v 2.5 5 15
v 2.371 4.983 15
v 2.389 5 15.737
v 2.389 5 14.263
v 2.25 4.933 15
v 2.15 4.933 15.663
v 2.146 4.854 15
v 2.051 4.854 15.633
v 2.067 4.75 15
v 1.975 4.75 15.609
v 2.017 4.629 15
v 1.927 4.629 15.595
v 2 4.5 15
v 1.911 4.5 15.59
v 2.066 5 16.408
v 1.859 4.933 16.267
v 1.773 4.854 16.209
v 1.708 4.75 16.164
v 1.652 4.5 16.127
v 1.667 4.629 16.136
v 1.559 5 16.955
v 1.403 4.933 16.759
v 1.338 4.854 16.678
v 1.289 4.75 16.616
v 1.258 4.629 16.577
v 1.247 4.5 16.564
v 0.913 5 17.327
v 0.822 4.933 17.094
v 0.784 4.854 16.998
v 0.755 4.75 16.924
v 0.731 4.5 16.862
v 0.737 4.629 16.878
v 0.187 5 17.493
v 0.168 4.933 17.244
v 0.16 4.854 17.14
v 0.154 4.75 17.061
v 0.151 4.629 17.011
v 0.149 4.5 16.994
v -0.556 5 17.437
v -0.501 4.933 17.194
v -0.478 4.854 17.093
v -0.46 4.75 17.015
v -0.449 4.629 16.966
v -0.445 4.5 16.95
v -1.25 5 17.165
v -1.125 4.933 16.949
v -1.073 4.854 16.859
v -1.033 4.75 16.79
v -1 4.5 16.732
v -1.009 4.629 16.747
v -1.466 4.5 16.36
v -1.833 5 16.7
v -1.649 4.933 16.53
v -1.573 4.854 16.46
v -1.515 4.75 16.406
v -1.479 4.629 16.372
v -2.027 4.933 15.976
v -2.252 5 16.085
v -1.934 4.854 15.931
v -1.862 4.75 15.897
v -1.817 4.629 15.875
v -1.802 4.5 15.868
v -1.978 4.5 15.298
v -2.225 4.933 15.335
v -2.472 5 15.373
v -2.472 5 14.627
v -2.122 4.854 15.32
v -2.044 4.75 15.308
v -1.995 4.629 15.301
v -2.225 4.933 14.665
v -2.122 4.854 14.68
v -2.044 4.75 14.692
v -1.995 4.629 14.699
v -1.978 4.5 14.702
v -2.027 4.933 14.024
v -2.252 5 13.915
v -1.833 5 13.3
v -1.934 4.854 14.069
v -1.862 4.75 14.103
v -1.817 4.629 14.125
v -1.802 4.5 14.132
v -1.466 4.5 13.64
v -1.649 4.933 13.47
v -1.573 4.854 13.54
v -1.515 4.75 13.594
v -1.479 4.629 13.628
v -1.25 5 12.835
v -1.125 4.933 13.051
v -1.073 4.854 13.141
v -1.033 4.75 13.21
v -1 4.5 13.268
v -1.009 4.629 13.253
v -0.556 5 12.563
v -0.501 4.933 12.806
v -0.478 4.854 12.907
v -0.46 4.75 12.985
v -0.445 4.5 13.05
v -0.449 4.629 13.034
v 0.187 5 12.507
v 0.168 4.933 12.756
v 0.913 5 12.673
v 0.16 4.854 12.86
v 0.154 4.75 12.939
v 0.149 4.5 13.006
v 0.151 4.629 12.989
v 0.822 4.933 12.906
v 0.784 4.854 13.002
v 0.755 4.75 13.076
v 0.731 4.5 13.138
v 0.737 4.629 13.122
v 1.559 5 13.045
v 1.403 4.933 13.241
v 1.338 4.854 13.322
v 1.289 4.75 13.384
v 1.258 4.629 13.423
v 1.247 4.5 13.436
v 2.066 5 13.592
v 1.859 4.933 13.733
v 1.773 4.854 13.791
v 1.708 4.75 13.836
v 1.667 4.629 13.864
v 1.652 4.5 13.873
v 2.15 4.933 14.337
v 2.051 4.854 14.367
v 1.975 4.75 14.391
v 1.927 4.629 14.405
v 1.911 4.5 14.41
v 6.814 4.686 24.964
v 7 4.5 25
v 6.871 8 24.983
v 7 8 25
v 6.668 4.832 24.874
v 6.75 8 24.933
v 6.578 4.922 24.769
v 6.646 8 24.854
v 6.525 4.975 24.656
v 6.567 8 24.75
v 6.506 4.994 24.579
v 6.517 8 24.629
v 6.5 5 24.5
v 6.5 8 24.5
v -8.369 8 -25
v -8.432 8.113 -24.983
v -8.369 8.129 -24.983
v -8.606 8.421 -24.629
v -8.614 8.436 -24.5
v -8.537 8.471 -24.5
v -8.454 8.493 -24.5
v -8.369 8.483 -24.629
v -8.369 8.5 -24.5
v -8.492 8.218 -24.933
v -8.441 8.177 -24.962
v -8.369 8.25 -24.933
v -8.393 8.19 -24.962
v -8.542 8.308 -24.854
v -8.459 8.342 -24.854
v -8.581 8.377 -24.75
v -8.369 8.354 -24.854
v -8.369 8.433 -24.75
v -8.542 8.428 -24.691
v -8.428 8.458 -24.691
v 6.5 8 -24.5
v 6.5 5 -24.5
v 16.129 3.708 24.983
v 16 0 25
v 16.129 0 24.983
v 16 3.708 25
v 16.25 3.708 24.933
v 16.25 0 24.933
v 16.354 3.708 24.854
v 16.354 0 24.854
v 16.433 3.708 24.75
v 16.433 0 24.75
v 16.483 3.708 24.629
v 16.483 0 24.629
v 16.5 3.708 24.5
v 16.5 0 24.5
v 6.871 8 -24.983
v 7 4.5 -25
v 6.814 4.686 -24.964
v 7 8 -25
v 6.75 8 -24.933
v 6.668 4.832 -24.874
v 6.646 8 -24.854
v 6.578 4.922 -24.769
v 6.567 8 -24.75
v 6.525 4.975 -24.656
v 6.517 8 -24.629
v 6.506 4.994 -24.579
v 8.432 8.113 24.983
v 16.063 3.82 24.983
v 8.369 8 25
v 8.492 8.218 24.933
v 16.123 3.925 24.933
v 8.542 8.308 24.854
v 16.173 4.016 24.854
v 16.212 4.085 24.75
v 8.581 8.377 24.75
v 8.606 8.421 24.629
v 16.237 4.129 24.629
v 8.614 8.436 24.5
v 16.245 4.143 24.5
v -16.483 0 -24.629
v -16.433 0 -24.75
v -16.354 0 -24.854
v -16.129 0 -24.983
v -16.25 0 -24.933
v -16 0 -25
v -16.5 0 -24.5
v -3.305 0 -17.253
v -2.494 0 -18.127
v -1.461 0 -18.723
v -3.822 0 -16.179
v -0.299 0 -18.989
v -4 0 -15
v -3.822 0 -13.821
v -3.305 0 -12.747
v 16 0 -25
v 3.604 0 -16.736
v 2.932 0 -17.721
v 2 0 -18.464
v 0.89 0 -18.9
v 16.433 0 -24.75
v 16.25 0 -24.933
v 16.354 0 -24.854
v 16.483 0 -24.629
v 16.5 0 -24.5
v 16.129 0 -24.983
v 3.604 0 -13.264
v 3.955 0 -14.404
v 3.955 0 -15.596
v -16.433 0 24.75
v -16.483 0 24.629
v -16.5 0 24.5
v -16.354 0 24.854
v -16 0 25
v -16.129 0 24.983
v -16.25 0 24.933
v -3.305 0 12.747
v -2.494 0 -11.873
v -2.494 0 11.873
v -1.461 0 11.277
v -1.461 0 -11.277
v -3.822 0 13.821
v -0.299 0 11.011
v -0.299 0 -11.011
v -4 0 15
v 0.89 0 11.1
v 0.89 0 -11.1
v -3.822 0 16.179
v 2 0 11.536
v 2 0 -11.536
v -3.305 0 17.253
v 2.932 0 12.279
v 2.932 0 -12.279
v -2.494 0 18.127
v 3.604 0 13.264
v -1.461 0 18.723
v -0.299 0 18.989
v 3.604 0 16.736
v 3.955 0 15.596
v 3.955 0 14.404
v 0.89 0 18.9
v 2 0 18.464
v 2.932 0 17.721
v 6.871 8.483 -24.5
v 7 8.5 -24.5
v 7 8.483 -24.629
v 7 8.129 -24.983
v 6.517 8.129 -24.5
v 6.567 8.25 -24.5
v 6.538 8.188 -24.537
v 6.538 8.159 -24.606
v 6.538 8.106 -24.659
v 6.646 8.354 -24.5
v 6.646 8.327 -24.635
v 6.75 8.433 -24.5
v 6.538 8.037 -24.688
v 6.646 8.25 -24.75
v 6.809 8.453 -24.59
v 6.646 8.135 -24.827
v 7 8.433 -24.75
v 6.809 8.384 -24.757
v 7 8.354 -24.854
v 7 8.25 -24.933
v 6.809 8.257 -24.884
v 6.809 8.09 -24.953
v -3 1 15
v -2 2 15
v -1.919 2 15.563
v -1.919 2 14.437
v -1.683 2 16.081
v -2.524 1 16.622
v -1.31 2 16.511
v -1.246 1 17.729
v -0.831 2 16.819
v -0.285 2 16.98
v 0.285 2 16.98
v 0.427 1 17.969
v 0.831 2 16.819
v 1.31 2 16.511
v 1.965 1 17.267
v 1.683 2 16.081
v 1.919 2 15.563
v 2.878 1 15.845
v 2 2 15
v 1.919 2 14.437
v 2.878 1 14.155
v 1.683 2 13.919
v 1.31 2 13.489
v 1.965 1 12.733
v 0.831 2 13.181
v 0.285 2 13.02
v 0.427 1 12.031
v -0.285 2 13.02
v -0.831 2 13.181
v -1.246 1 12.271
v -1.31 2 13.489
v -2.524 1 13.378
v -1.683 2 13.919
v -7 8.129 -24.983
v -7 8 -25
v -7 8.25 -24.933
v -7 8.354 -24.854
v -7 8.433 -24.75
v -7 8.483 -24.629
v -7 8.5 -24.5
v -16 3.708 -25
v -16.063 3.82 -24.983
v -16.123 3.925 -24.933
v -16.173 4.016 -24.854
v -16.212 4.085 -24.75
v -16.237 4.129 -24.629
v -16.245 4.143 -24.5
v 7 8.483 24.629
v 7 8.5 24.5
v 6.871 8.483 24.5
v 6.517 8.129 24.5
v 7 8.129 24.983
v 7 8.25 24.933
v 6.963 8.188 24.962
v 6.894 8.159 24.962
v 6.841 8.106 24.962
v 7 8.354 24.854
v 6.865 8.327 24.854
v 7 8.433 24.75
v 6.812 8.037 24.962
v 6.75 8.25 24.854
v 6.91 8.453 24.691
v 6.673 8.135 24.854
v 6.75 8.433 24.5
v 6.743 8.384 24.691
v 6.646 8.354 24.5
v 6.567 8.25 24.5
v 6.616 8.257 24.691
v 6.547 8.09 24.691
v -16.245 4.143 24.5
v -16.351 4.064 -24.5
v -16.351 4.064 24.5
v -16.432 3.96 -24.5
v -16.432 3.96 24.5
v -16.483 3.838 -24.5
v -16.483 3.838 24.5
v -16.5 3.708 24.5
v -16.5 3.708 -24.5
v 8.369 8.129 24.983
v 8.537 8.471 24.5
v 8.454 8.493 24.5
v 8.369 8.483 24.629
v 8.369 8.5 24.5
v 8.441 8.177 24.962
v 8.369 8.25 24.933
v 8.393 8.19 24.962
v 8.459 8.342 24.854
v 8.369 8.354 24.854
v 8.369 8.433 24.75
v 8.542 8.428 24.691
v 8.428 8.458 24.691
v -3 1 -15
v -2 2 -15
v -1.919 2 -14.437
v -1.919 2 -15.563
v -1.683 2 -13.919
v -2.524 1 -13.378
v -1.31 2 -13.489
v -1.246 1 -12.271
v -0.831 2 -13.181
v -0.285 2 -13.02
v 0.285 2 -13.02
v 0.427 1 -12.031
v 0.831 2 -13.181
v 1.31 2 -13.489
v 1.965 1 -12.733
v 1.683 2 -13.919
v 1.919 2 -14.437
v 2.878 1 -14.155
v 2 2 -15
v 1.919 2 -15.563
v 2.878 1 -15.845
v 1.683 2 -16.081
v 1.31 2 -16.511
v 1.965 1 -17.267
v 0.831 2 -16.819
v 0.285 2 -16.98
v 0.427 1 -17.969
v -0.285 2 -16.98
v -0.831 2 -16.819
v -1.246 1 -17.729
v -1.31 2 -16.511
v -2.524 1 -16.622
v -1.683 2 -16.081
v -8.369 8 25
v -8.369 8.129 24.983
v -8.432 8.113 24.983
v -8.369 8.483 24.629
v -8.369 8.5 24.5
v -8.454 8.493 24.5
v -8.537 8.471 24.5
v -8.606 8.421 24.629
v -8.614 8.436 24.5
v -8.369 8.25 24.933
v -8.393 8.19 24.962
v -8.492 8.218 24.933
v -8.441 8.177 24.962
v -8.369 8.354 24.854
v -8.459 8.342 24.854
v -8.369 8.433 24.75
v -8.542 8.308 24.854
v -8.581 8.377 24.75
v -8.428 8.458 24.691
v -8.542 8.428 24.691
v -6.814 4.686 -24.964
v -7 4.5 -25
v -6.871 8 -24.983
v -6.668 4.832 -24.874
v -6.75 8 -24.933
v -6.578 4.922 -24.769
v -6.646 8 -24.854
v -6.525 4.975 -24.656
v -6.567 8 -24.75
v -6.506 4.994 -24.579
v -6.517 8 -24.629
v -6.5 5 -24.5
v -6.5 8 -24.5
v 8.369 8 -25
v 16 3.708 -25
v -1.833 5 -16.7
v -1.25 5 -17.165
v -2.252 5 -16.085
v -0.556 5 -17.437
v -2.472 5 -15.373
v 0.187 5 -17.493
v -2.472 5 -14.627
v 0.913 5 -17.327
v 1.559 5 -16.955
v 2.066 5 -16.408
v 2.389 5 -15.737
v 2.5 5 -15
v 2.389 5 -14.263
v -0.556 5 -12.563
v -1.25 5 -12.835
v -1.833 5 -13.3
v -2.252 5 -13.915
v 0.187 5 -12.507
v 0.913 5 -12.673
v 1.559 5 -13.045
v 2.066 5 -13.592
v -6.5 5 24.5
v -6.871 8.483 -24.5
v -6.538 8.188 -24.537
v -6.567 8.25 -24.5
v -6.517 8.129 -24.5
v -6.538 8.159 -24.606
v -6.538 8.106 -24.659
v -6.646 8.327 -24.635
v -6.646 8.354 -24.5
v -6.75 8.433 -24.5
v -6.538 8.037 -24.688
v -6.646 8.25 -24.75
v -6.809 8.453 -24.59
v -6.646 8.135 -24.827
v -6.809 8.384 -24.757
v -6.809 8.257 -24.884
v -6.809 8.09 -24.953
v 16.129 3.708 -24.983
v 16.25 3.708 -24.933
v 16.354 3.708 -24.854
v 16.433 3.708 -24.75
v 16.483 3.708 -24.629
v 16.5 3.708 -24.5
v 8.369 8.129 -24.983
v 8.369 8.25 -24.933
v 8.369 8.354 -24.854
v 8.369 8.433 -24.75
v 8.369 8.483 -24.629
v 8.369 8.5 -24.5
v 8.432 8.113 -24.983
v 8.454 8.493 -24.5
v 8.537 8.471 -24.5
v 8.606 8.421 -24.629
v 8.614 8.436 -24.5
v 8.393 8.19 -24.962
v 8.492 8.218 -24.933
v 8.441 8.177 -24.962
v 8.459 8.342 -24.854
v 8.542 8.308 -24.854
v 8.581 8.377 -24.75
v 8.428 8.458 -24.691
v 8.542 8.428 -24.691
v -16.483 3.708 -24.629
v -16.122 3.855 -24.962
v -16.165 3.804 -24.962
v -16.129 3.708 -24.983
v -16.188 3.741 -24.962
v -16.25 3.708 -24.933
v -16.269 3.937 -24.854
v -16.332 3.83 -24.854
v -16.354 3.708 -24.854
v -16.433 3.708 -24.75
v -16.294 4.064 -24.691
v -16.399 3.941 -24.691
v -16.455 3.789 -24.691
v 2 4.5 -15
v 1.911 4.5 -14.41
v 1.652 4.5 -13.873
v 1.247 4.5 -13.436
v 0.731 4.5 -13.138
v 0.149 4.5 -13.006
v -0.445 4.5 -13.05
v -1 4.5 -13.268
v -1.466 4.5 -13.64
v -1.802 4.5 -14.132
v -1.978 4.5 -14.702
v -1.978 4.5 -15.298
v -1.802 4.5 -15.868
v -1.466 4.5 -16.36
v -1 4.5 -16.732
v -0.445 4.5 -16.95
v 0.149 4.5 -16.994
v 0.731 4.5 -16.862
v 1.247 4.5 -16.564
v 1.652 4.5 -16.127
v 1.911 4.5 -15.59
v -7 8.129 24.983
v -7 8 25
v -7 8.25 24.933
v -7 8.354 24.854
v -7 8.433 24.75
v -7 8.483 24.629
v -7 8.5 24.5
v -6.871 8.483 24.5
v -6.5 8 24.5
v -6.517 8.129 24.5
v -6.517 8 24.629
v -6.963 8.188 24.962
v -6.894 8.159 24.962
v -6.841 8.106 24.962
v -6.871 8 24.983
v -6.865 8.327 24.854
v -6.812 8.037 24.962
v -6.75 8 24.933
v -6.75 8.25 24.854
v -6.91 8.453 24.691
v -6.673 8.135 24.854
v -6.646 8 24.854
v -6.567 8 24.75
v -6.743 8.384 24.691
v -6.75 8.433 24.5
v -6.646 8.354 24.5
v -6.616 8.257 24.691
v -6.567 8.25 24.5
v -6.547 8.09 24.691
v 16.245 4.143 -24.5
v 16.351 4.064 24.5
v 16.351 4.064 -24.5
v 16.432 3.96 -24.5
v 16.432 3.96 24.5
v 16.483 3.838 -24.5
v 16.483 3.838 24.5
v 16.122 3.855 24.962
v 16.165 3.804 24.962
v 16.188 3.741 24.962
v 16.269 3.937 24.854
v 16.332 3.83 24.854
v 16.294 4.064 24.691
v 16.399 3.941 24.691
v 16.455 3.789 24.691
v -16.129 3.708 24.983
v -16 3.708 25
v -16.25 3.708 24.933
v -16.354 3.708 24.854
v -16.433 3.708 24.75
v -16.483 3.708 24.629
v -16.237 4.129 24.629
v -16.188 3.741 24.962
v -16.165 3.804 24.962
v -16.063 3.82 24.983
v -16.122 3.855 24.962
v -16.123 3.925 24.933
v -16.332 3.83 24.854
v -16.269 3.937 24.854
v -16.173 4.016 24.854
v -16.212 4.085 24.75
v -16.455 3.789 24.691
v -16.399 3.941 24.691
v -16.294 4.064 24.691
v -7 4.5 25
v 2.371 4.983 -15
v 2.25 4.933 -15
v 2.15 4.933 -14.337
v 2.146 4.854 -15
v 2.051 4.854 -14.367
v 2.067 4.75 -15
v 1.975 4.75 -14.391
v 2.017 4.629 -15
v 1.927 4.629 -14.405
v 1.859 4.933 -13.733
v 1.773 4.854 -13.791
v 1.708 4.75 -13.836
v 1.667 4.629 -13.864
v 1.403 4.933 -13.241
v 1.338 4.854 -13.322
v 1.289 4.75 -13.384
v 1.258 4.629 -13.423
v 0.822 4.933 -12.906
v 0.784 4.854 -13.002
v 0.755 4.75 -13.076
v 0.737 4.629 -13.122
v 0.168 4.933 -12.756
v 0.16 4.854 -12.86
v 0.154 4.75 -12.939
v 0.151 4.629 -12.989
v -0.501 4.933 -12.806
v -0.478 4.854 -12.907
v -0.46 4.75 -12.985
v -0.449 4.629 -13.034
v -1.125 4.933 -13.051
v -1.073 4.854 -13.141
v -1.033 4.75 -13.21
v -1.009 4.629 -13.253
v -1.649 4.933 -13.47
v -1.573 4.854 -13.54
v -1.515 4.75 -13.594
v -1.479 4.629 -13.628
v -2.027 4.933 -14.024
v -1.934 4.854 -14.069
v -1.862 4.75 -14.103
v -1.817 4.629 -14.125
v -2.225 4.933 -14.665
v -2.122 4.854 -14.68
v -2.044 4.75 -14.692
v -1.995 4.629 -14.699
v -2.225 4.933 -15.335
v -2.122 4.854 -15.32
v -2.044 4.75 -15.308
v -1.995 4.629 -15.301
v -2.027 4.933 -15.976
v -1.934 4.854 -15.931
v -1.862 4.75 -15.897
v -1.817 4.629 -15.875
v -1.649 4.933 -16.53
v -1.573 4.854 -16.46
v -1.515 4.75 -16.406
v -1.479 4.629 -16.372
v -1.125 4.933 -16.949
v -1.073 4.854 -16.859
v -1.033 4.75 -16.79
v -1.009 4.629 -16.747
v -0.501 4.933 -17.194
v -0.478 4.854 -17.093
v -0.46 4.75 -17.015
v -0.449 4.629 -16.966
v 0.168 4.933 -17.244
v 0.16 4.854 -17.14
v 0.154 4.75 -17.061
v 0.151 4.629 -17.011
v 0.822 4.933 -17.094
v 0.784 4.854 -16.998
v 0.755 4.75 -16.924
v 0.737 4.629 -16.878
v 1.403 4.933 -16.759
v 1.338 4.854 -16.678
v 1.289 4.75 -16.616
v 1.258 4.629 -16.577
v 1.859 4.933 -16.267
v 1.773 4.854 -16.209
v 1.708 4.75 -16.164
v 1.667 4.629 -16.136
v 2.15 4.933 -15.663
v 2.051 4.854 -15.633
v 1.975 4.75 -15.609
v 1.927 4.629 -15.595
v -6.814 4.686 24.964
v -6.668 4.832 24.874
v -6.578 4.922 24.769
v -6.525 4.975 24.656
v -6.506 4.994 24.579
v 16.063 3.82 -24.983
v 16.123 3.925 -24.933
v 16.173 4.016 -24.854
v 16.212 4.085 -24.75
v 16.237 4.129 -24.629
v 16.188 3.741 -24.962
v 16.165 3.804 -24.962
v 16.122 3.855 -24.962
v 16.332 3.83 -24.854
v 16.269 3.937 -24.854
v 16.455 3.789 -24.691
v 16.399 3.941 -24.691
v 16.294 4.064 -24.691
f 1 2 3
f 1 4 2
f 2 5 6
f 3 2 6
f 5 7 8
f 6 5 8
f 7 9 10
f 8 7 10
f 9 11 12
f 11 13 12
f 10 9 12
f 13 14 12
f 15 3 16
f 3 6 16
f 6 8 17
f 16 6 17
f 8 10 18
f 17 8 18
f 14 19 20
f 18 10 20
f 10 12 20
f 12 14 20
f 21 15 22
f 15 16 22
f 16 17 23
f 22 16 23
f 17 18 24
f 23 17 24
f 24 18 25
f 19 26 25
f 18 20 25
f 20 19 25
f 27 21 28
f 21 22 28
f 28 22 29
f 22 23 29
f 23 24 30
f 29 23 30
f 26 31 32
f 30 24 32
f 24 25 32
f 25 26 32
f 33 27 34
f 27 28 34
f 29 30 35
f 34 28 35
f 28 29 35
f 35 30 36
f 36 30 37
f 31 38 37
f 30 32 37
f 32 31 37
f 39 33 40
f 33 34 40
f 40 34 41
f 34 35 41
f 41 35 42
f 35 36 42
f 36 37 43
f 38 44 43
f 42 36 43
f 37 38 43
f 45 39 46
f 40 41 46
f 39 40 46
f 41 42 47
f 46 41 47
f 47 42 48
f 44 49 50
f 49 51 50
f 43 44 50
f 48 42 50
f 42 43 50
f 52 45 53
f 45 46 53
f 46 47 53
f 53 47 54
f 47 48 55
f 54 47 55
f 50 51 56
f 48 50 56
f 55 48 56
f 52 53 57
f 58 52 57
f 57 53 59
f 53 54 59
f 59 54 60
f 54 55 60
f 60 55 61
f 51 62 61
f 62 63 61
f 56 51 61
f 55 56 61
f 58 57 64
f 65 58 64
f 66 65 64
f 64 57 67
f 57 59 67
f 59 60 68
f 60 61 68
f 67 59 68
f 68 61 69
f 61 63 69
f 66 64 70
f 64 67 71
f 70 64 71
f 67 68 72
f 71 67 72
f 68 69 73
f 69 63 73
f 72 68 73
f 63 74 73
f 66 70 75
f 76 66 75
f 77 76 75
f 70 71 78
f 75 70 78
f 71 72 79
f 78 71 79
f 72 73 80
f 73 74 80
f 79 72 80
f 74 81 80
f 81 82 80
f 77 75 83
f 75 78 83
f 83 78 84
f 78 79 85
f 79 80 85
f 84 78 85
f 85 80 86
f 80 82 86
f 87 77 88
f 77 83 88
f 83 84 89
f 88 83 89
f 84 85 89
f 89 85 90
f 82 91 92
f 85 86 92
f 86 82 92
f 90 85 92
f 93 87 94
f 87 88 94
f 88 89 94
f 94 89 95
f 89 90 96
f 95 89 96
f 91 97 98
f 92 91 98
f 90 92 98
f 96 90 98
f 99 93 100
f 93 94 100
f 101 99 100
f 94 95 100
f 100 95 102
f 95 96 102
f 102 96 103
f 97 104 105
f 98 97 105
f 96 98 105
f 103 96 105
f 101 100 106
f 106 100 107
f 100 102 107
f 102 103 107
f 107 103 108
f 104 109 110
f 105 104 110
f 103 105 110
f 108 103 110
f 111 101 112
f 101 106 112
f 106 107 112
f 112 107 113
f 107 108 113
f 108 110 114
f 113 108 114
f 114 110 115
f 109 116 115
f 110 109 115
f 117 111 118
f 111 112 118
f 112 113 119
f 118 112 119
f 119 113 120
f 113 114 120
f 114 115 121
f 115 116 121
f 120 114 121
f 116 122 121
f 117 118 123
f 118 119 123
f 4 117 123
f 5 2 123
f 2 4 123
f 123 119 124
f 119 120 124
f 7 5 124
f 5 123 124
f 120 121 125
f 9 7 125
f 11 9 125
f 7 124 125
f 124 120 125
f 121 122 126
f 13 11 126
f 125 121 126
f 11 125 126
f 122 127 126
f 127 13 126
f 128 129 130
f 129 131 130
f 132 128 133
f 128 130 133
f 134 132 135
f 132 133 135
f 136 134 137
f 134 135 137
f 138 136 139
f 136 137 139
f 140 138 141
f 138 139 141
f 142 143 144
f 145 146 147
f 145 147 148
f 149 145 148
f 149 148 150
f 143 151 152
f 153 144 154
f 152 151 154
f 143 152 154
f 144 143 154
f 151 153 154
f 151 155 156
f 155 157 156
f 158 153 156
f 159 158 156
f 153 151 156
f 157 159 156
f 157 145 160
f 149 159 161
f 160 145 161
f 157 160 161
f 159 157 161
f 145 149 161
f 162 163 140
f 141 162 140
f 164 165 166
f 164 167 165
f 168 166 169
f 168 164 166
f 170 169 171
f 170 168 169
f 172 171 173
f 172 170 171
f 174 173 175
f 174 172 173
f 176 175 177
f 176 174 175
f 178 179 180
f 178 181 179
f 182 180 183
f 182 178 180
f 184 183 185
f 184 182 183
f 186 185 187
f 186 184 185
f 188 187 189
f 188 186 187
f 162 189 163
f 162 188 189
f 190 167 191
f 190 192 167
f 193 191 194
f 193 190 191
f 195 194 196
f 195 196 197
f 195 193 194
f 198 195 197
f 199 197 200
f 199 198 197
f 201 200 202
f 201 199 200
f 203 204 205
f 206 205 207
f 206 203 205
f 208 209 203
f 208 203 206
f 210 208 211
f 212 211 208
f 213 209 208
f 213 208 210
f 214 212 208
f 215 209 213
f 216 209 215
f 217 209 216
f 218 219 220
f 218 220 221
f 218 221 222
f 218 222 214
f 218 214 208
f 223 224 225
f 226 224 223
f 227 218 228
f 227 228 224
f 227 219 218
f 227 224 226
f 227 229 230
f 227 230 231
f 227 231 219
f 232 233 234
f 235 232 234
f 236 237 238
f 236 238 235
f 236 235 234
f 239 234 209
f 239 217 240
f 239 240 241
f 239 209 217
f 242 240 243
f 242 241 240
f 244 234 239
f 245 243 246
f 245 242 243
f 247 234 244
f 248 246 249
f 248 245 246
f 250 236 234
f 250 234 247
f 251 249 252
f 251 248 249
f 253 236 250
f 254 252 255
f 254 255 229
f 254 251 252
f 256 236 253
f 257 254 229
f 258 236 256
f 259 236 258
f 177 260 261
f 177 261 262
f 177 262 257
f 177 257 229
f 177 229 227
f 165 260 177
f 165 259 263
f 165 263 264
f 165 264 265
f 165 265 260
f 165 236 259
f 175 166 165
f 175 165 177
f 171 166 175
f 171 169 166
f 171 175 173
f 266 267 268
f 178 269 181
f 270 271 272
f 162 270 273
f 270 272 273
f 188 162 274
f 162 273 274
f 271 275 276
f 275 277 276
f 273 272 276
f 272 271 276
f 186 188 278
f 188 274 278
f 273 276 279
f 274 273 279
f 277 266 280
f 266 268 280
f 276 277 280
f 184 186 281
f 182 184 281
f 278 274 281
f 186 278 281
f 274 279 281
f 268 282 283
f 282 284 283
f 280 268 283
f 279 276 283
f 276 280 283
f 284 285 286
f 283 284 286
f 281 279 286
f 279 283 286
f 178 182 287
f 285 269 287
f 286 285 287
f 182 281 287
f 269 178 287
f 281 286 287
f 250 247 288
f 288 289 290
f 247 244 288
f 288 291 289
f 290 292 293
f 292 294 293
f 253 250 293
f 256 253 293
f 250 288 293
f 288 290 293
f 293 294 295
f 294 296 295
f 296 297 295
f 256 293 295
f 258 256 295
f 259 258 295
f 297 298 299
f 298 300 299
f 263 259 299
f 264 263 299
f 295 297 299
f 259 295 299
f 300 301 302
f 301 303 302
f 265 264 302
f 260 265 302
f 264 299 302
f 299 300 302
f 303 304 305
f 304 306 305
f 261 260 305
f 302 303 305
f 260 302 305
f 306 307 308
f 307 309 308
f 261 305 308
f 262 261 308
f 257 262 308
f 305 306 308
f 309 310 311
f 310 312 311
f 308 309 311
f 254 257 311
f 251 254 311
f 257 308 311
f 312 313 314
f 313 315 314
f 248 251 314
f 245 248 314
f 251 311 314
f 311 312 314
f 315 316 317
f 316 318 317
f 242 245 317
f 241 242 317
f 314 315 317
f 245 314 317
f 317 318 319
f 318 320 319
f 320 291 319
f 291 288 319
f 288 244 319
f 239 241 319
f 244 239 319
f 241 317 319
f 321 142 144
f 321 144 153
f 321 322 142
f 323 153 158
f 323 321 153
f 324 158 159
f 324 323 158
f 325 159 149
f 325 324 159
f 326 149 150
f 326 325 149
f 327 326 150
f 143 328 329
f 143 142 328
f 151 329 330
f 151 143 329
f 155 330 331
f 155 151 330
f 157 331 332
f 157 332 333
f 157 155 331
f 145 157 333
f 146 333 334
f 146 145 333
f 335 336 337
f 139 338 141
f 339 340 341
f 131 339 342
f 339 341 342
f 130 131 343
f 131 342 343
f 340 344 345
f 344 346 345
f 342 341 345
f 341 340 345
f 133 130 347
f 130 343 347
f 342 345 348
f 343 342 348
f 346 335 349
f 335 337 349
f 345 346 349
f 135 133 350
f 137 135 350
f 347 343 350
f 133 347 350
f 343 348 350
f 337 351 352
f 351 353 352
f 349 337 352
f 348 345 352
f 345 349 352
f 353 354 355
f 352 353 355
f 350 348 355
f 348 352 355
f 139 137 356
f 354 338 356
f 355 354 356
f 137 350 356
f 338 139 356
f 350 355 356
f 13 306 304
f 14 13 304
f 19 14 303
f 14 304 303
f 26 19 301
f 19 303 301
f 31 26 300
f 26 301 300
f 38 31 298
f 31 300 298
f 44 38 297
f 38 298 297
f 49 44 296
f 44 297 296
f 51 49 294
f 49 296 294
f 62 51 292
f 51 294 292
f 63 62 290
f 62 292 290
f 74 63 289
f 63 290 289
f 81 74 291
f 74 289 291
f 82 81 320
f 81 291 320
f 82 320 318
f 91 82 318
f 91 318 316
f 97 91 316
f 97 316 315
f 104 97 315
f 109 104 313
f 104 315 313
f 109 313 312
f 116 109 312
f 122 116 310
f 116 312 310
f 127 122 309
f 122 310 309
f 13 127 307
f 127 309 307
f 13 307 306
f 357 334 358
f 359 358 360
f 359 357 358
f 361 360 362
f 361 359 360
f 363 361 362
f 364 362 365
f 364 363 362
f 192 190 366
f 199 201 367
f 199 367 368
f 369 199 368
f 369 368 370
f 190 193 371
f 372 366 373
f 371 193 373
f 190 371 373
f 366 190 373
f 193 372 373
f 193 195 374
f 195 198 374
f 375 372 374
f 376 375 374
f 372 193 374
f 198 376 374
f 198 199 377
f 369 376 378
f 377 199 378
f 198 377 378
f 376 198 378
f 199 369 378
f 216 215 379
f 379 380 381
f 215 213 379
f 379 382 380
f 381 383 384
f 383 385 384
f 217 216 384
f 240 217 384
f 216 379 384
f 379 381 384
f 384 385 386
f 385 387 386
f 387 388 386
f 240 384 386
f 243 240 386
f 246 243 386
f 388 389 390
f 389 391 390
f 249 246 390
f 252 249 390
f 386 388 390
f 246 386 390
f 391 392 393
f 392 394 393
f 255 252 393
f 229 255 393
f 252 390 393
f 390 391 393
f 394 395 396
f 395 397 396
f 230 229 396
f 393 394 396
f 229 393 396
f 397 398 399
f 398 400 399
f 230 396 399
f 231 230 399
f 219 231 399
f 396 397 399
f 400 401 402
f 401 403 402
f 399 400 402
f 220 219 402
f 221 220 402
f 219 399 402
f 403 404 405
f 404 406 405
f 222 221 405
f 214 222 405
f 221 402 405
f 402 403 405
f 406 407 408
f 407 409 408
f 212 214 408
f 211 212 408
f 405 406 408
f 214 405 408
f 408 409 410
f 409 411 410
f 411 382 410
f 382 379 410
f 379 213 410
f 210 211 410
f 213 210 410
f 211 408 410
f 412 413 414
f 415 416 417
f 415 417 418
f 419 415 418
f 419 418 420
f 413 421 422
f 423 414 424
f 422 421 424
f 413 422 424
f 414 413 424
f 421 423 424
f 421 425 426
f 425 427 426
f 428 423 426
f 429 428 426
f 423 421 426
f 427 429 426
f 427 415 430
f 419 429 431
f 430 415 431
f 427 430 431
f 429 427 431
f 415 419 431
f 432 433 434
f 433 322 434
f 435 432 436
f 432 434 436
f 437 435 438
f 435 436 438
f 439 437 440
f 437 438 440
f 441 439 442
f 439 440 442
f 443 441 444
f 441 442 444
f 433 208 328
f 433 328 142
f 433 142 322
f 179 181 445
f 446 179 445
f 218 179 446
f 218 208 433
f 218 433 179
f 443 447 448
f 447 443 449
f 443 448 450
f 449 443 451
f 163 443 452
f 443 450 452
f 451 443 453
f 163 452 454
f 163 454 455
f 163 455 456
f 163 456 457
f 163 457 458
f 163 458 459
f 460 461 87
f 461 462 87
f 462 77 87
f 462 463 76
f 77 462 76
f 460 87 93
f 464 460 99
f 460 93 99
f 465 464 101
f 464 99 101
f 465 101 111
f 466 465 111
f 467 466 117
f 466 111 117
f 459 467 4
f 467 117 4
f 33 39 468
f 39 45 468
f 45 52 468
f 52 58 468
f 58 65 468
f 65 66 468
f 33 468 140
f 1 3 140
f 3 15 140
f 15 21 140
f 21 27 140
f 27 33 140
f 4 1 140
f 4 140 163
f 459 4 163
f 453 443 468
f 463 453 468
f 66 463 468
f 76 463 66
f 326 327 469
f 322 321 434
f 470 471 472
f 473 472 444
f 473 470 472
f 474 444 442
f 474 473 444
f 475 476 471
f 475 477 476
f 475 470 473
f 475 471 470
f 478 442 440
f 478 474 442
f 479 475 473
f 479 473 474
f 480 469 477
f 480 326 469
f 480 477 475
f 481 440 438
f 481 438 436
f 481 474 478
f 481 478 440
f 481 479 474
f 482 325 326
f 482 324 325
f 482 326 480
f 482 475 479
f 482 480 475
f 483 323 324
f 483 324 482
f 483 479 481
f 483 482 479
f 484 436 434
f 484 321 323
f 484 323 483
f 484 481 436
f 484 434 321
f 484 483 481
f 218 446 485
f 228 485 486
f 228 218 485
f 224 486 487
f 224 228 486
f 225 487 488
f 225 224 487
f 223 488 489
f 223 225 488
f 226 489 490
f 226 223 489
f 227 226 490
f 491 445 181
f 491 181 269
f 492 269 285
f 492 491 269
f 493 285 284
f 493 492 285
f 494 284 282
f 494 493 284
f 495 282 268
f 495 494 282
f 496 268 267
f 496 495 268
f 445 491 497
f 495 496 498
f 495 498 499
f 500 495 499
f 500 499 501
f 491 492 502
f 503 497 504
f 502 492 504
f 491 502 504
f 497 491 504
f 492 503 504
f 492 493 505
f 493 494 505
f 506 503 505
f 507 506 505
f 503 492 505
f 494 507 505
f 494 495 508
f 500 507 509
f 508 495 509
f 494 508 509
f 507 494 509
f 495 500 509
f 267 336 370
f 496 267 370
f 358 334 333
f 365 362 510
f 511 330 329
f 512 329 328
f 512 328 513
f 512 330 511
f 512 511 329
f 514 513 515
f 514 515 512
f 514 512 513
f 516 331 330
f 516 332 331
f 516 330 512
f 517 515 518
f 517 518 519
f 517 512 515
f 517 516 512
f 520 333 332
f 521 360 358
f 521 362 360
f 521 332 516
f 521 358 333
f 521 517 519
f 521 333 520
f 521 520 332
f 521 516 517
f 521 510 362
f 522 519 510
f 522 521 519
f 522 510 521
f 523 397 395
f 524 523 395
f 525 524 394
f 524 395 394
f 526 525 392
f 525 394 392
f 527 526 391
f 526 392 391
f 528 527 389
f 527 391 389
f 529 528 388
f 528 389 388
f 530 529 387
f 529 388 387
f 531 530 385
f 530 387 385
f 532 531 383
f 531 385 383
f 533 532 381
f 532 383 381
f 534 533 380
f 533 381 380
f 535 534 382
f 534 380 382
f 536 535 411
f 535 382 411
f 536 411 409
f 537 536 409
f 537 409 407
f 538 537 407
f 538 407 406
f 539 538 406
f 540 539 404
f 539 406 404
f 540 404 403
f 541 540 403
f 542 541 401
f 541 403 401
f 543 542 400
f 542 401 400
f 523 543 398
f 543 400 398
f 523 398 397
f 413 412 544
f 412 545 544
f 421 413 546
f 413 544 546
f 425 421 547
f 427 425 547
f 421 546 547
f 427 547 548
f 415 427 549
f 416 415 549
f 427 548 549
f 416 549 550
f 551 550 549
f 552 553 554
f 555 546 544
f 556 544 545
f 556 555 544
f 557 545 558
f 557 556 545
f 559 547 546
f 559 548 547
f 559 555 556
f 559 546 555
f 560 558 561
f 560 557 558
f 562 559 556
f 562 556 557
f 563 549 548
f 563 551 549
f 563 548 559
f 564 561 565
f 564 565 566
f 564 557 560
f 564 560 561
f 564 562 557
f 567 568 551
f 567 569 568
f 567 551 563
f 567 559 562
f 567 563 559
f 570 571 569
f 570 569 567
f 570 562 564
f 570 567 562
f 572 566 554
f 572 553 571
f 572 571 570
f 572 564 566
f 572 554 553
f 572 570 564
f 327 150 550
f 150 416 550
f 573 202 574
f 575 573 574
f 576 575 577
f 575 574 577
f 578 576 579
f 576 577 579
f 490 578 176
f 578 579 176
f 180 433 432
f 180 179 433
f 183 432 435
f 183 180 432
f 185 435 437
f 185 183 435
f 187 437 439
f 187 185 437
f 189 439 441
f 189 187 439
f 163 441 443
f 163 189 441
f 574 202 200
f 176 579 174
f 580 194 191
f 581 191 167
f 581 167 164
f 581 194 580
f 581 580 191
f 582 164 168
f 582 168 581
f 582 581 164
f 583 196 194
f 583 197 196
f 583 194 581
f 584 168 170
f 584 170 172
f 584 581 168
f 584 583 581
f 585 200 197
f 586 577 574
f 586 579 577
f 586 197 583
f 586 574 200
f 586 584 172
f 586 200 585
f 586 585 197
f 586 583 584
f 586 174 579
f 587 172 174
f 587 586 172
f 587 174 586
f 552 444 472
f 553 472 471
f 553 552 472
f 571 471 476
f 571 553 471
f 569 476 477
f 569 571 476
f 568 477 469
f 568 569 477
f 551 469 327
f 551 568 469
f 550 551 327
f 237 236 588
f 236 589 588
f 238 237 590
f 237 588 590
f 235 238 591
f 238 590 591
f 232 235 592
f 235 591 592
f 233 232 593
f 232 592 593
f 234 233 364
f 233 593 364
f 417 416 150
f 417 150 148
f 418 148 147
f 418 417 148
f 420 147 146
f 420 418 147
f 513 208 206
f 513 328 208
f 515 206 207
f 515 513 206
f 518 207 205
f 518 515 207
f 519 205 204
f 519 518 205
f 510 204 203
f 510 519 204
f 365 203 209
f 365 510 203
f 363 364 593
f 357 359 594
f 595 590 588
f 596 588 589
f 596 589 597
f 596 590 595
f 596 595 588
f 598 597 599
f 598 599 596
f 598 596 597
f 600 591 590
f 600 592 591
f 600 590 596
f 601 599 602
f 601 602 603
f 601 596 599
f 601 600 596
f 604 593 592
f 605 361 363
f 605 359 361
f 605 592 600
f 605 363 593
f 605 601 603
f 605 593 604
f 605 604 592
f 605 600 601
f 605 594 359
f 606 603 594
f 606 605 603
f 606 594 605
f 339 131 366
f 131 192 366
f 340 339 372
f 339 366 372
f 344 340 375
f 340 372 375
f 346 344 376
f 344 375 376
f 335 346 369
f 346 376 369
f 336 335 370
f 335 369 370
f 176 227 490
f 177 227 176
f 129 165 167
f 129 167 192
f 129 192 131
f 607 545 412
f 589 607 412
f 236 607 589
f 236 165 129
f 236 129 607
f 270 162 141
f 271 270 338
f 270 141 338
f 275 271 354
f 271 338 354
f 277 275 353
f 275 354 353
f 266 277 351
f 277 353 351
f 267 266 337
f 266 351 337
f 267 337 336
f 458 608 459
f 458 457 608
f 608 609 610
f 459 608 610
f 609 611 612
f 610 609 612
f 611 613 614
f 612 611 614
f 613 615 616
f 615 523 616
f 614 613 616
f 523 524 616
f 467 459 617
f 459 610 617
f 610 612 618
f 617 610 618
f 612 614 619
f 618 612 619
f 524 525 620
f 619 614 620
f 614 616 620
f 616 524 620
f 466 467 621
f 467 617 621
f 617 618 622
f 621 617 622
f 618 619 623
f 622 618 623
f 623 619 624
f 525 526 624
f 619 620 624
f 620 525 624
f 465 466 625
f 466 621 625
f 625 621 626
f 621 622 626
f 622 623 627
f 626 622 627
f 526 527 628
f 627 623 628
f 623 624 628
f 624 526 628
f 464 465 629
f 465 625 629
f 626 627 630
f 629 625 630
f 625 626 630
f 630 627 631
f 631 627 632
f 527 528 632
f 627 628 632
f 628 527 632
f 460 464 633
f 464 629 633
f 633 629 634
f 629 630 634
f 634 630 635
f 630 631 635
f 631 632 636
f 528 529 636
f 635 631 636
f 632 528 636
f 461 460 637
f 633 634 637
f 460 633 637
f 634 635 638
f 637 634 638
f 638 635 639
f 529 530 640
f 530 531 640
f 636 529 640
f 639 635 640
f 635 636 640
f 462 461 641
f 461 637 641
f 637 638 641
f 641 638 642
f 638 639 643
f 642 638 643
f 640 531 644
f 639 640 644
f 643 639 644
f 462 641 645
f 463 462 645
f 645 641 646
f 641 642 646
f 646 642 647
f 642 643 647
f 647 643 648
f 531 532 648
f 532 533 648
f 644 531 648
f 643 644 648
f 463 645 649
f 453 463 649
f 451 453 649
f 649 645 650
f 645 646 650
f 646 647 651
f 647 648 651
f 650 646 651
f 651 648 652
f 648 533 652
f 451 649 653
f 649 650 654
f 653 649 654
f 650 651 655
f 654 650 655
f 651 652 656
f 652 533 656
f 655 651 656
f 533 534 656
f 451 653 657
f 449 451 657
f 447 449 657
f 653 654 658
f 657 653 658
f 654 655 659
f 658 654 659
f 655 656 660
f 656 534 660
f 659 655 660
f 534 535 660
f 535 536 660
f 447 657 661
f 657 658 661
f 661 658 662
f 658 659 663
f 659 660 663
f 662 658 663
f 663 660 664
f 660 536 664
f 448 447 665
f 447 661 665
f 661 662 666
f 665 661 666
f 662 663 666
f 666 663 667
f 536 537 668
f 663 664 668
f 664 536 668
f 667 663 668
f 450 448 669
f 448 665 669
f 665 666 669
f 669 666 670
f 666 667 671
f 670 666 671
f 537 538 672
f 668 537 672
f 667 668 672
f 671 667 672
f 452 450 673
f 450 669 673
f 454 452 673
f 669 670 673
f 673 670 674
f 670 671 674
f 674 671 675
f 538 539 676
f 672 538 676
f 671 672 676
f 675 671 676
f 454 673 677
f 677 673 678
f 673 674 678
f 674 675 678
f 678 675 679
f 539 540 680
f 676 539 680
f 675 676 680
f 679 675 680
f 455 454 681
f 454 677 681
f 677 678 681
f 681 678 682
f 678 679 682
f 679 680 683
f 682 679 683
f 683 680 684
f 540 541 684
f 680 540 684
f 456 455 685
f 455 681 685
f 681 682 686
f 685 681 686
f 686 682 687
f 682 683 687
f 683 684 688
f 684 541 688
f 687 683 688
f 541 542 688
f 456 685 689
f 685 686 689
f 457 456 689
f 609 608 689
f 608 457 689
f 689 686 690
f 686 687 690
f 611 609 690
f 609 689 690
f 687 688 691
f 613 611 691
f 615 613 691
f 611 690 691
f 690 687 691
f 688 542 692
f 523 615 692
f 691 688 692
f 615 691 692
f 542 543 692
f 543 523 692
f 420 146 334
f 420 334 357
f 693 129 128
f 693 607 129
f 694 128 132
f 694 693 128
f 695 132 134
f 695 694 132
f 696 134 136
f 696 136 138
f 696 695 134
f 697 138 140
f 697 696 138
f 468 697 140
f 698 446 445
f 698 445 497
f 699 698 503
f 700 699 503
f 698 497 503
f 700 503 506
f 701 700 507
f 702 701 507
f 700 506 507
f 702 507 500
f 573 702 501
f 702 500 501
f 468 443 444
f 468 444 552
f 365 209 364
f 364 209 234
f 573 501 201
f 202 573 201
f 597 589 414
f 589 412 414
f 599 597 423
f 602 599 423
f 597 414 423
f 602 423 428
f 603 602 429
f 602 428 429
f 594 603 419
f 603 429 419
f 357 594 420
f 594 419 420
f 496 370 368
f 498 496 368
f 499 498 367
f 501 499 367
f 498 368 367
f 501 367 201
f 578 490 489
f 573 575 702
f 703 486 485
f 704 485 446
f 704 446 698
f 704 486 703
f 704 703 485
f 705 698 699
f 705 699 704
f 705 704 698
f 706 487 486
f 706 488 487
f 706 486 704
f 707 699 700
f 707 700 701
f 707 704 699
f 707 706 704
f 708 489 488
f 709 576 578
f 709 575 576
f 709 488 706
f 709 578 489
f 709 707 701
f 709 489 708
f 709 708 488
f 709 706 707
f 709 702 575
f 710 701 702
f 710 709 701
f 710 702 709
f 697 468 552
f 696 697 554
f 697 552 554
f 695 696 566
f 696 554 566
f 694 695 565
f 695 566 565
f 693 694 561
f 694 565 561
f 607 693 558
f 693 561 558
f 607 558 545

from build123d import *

# Parameters (mm, degrees)
F0_W           = 12
F0_H           = 50
F0_R           = 2
F0_W_2         = 0.5
F0_W_3         = 10
F1_DEPTH       = 5
F2_DEPTH       = 8.5
F3_SIZE2       = 8
F3_SIZE        = 4.5
F4_SIZE2       = 8
F4_SIZE        = 4.5
F5_D           = 4
F5_CSINK_D     = 8
F5_CSINK_ANGLE = 90
F6_R           = 0.5


with BuildPart() as f1:
    # F0 (on Front) → F1 (new body)
    with BuildSketch(Plane.XZ):
        Rectangle(F0_W, F0_H)
        with Locations((0, -15)):
            Circle(F0_R, mode=Mode.SUBTRACT)
        with Locations((0, 15)):
            Circle(F0_R, mode=Mode.SUBTRACT)
        with Locations((6.25, 0)):
            Rectangle(F0_W_2, F0_H)
        with Locations((-6.25, 0)):
            Rectangle(F0_W_2, F0_H)
        with Locations((11.5, 0)):
            Rectangle(F0_W_3, F0_H)
        with Locations((-11.5, 0)):
            Rectangle(F0_W_3, F0_H)
    extrude(amount=-F1_DEPTH)

    # F0 (on Front) → F2 (join)
    with BuildSketch(Plane.XZ):
        with Locations((-11.5, 0)):
            Rectangle(F0_W_3, F0_H)
        with Locations((11.5, 0)):
            Rectangle(F0_W_3, F0_H)
    extrude(amount=-F2_DEPTH)

    # F3
    f3_edges = [f1.edges().sort_by_distance(p)[0] for p in [
        (-16.5, 8.5, 0),
    ]]
    f3_side = f1.faces().sort_by_distance((-16.5, 4.25, 0))[0]
    chamfer(f3_edges, length=F3_SIZE, length2=F3_SIZE2, reference=f3_side)

    # F4
    f4_edges = [f1.edges().sort_by_distance(p)[0] for p in [
        (16.5, 8.5, 0),
    ]]
    f4_side = f1.faces().sort_by_distance((16.5, 4.25, 0))[0]
    chamfer(f4_edges, length=F4_SIZE, length2=F4_SIZE2, reference=f4_side)

    # F5 (through all)
    with Locations(Plane.XZ):
        with Locations((0, 15), (0, -15)):
            CounterSinkHole(F5_D / 2, F5_CSINK_D / 2, counter_sink_angle=F5_CSINK_ANGLE)

    # F6
    f6_edges = [f1.edges().sort_by_distance(p)[0] for p in [
        (12.5, 6.25, -25),
        (16.5, 4, 0),
        (8.5, 8.5, 0),
        (12.5, 6.25, 25),
        (7.5, 8.5, -25),
        (6.5, 8.5, 0),
        (7.5, 8.5, 25),
        (-7.5, 8.5, -25),
        (-8.5, 8.5, 0),
        (-6.5, 8.5, 0),
        (-7.5, 8.5, 25),
        (-12.5, 6.25, 25),
        (-16.5, 4, 0),
        (-12.5, 6.25, -25),
        (-2, 5, -15),
        (-2, 5, 15),
        (0, 5, -25),
        (6.5, 6.75, -25),
        (-6.5, 6.75, -25),
        (-16.5, 2, -25),
        (16.5, 2, -25),
        (16.5, 2, 25),
        (6.5, 6.75, 25),
        (0, 5, 25),
        (-6.5, 6.75, 25),
        (-16.5, 2, 25),
    ]]
    fillet(f6_edges, radius=F6_R)


solid = f1.part
